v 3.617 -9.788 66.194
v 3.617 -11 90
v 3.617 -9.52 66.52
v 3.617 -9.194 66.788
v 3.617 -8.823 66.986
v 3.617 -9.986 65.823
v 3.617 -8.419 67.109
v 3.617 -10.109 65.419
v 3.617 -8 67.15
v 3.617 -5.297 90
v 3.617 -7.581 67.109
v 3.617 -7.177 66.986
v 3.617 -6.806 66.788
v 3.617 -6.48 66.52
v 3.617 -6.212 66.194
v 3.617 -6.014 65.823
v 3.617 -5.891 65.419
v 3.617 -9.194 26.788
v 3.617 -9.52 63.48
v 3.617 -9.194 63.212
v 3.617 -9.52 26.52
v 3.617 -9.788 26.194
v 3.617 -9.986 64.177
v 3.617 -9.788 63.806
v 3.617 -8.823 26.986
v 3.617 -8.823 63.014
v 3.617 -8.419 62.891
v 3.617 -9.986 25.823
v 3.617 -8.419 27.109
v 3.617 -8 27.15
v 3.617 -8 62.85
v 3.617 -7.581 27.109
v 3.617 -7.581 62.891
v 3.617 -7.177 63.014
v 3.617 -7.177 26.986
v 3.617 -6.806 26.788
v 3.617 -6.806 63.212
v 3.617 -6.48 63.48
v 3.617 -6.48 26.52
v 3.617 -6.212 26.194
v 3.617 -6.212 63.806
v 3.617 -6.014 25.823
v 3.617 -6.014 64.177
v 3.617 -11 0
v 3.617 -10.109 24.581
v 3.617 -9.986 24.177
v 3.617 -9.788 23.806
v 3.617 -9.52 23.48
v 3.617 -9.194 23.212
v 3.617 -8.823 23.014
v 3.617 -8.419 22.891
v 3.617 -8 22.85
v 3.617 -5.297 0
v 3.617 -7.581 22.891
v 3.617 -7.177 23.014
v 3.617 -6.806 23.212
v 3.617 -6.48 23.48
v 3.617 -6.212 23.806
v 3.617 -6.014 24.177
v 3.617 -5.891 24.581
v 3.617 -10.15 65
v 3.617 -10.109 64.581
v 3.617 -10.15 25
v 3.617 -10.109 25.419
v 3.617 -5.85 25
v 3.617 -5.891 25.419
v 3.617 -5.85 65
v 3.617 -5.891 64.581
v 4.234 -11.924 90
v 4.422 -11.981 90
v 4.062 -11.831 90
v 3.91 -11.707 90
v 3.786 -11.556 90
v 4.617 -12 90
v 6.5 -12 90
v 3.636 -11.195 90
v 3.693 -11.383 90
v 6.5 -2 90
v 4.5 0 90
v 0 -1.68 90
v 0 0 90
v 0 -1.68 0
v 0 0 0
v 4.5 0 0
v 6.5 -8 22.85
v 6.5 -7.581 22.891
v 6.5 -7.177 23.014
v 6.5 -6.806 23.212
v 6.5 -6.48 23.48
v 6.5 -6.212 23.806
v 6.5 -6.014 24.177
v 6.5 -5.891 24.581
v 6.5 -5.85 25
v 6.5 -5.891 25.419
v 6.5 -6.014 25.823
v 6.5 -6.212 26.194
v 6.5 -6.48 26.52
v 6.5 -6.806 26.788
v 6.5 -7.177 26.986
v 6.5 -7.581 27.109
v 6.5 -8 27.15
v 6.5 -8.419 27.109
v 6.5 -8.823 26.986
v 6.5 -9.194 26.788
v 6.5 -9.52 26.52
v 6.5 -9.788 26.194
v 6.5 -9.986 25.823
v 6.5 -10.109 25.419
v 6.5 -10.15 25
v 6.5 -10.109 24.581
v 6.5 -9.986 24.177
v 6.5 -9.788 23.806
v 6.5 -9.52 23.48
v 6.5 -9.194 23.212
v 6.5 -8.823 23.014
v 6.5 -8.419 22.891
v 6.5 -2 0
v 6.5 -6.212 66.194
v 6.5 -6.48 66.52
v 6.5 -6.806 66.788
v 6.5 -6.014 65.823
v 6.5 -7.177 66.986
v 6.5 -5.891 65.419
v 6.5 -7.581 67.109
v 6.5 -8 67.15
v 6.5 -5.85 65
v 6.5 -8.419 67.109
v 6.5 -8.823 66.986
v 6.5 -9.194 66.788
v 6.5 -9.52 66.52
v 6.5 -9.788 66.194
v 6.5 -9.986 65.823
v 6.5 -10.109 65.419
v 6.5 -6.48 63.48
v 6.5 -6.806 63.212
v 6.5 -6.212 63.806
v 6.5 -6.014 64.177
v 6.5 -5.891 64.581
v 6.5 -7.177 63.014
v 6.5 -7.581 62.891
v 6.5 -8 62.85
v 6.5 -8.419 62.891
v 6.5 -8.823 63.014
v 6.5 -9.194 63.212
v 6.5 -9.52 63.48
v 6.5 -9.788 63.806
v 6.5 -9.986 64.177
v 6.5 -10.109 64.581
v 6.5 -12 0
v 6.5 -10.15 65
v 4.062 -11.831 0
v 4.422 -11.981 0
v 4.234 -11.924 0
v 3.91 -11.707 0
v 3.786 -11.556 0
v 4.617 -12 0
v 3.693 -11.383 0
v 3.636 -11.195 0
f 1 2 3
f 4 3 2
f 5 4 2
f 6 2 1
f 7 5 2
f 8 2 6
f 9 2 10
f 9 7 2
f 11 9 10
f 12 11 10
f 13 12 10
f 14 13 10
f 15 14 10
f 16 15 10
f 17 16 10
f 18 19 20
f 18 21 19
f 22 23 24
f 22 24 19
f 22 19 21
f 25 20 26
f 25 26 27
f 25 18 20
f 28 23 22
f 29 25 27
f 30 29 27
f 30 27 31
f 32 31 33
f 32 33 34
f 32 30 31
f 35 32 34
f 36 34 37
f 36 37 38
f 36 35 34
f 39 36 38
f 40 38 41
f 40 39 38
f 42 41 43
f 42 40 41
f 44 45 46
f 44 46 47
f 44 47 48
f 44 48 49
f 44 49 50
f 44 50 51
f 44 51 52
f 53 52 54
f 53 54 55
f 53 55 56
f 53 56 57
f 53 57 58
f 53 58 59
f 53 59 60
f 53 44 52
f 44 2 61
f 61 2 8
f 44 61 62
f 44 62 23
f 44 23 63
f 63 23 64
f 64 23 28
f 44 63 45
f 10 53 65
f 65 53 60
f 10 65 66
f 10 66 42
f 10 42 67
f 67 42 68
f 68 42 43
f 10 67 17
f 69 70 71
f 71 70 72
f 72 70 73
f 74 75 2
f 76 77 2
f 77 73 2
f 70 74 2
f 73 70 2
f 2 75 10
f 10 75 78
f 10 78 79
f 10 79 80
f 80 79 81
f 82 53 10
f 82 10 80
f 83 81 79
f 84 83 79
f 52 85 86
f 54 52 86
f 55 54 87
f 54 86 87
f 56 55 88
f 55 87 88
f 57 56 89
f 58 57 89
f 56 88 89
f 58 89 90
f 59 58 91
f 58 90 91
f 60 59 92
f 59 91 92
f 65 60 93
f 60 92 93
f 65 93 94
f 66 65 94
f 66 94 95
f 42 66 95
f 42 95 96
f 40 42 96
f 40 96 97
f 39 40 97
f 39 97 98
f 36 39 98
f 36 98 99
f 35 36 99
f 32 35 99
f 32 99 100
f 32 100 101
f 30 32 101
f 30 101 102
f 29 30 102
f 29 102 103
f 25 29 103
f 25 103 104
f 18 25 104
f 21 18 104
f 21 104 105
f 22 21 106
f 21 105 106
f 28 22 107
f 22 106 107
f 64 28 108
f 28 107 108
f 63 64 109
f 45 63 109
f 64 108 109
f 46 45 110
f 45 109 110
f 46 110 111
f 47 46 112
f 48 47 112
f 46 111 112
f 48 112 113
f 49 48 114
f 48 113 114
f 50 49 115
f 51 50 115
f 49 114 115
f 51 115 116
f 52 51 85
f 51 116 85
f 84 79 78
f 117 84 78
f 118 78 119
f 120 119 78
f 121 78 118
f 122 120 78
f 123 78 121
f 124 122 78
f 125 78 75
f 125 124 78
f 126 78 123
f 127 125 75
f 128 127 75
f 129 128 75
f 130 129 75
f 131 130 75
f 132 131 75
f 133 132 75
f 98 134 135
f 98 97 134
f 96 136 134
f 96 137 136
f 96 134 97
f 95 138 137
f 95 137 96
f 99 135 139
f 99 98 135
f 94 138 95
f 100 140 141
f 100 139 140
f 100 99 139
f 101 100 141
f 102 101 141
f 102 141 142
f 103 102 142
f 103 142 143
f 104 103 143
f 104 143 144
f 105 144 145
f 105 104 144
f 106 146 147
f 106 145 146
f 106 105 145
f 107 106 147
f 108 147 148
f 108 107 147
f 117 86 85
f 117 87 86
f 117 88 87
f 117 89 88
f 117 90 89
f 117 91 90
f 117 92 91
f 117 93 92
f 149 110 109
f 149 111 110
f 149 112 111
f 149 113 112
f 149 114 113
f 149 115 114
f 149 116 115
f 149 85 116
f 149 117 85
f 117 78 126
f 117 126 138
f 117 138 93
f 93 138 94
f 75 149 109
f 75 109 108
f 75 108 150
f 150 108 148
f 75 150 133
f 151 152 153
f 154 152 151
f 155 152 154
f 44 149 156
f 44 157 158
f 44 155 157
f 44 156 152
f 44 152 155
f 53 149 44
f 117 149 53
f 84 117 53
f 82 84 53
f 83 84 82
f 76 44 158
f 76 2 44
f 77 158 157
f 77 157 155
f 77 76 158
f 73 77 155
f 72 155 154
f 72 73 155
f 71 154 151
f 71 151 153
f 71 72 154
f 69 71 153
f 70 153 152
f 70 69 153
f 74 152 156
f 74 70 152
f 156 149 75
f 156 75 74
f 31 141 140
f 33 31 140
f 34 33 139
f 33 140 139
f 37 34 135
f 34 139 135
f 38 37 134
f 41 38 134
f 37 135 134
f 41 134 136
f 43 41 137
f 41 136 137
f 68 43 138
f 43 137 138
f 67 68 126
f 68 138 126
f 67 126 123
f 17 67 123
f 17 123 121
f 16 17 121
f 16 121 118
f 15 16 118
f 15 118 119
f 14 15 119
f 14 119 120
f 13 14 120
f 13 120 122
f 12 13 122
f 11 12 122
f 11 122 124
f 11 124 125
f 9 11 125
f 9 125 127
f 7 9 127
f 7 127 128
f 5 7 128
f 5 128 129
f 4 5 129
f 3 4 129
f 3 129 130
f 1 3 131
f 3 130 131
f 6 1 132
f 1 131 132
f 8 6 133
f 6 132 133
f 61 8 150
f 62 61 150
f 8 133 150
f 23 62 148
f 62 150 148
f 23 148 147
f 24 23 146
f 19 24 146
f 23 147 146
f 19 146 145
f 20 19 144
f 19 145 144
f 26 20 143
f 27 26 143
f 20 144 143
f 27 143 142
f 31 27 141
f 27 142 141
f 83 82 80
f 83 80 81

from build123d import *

# Parameters (mm, degrees)
BOSS_EXTRUDE1_DEPTH = 90
CUT_EXTRUDE1_REACH  = 93.029
SKETCH4_R           = 2.15
FILLET1_R           = 1


with BuildPart() as part:
    # Sketch3 → Boss-Extrude1 (new body)
    with BuildSketch(Plane.XY):
        Polygon((3.617157288, -12), (3.617157288, -5.297157288), (0, -1.68), (0, 0), (4.5, 0), (6.5, -2), (6.5, -12), align=None)
    extrude(amount=BOSS_EXTRUDE1_DEPTH)

    # Sketch4 → Cut-Extrude1 (cut, up to next)
    with BuildSketch(Plane(origin=(6.5, 0, 0), x_dir=(0, 0, -1), z_dir=(1, 0, 0)), mode=Mode.PRIVATE) as cut_extrude1_sk1:
        with Locations((-65, -8)):
            Circle(SKETCH4_R)
    cut_extrude1_tool1 = extrude(cut_extrude1_sk1.sketch, amount=-CUT_EXTRUDE1_REACH, mode=Mode.PRIVATE) & part.part
    # Sketch4 → Cut-Extrude1 (cut, up to next)
    with BuildSketch(Plane(origin=(6.5, 0, 0), x_dir=(0, 0, -1), z_dir=(1, 0, 0)), mode=Mode.PRIVATE) as cut_extrude1_sk2:
        with Locations((-25, -8)):
            Circle(SKETCH4_R)
    cut_extrude1_tool2 = extrude(cut_extrude1_sk2.sketch, amount=-CUT_EXTRUDE1_REACH, mode=Mode.PRIVATE) & part.part
    add(cut_extrude1_tool1.solids().sort_by_distance((6.5, -8, 65))[0], mode=Mode.SUBTRACT)
    add(cut_extrude1_tool2.solids().sort_by_distance((6.5, -8, 25))[0], mode=Mode.SUBTRACT)

    # Fillet1
    fillet1_edges = [part.edges().sort_by_distance(p)[0] for p in [
        (3.617157288, -12, 45),
    ]]
    fillet(fillet1_edges, radius=FILLET1_R)


solid = part.part
